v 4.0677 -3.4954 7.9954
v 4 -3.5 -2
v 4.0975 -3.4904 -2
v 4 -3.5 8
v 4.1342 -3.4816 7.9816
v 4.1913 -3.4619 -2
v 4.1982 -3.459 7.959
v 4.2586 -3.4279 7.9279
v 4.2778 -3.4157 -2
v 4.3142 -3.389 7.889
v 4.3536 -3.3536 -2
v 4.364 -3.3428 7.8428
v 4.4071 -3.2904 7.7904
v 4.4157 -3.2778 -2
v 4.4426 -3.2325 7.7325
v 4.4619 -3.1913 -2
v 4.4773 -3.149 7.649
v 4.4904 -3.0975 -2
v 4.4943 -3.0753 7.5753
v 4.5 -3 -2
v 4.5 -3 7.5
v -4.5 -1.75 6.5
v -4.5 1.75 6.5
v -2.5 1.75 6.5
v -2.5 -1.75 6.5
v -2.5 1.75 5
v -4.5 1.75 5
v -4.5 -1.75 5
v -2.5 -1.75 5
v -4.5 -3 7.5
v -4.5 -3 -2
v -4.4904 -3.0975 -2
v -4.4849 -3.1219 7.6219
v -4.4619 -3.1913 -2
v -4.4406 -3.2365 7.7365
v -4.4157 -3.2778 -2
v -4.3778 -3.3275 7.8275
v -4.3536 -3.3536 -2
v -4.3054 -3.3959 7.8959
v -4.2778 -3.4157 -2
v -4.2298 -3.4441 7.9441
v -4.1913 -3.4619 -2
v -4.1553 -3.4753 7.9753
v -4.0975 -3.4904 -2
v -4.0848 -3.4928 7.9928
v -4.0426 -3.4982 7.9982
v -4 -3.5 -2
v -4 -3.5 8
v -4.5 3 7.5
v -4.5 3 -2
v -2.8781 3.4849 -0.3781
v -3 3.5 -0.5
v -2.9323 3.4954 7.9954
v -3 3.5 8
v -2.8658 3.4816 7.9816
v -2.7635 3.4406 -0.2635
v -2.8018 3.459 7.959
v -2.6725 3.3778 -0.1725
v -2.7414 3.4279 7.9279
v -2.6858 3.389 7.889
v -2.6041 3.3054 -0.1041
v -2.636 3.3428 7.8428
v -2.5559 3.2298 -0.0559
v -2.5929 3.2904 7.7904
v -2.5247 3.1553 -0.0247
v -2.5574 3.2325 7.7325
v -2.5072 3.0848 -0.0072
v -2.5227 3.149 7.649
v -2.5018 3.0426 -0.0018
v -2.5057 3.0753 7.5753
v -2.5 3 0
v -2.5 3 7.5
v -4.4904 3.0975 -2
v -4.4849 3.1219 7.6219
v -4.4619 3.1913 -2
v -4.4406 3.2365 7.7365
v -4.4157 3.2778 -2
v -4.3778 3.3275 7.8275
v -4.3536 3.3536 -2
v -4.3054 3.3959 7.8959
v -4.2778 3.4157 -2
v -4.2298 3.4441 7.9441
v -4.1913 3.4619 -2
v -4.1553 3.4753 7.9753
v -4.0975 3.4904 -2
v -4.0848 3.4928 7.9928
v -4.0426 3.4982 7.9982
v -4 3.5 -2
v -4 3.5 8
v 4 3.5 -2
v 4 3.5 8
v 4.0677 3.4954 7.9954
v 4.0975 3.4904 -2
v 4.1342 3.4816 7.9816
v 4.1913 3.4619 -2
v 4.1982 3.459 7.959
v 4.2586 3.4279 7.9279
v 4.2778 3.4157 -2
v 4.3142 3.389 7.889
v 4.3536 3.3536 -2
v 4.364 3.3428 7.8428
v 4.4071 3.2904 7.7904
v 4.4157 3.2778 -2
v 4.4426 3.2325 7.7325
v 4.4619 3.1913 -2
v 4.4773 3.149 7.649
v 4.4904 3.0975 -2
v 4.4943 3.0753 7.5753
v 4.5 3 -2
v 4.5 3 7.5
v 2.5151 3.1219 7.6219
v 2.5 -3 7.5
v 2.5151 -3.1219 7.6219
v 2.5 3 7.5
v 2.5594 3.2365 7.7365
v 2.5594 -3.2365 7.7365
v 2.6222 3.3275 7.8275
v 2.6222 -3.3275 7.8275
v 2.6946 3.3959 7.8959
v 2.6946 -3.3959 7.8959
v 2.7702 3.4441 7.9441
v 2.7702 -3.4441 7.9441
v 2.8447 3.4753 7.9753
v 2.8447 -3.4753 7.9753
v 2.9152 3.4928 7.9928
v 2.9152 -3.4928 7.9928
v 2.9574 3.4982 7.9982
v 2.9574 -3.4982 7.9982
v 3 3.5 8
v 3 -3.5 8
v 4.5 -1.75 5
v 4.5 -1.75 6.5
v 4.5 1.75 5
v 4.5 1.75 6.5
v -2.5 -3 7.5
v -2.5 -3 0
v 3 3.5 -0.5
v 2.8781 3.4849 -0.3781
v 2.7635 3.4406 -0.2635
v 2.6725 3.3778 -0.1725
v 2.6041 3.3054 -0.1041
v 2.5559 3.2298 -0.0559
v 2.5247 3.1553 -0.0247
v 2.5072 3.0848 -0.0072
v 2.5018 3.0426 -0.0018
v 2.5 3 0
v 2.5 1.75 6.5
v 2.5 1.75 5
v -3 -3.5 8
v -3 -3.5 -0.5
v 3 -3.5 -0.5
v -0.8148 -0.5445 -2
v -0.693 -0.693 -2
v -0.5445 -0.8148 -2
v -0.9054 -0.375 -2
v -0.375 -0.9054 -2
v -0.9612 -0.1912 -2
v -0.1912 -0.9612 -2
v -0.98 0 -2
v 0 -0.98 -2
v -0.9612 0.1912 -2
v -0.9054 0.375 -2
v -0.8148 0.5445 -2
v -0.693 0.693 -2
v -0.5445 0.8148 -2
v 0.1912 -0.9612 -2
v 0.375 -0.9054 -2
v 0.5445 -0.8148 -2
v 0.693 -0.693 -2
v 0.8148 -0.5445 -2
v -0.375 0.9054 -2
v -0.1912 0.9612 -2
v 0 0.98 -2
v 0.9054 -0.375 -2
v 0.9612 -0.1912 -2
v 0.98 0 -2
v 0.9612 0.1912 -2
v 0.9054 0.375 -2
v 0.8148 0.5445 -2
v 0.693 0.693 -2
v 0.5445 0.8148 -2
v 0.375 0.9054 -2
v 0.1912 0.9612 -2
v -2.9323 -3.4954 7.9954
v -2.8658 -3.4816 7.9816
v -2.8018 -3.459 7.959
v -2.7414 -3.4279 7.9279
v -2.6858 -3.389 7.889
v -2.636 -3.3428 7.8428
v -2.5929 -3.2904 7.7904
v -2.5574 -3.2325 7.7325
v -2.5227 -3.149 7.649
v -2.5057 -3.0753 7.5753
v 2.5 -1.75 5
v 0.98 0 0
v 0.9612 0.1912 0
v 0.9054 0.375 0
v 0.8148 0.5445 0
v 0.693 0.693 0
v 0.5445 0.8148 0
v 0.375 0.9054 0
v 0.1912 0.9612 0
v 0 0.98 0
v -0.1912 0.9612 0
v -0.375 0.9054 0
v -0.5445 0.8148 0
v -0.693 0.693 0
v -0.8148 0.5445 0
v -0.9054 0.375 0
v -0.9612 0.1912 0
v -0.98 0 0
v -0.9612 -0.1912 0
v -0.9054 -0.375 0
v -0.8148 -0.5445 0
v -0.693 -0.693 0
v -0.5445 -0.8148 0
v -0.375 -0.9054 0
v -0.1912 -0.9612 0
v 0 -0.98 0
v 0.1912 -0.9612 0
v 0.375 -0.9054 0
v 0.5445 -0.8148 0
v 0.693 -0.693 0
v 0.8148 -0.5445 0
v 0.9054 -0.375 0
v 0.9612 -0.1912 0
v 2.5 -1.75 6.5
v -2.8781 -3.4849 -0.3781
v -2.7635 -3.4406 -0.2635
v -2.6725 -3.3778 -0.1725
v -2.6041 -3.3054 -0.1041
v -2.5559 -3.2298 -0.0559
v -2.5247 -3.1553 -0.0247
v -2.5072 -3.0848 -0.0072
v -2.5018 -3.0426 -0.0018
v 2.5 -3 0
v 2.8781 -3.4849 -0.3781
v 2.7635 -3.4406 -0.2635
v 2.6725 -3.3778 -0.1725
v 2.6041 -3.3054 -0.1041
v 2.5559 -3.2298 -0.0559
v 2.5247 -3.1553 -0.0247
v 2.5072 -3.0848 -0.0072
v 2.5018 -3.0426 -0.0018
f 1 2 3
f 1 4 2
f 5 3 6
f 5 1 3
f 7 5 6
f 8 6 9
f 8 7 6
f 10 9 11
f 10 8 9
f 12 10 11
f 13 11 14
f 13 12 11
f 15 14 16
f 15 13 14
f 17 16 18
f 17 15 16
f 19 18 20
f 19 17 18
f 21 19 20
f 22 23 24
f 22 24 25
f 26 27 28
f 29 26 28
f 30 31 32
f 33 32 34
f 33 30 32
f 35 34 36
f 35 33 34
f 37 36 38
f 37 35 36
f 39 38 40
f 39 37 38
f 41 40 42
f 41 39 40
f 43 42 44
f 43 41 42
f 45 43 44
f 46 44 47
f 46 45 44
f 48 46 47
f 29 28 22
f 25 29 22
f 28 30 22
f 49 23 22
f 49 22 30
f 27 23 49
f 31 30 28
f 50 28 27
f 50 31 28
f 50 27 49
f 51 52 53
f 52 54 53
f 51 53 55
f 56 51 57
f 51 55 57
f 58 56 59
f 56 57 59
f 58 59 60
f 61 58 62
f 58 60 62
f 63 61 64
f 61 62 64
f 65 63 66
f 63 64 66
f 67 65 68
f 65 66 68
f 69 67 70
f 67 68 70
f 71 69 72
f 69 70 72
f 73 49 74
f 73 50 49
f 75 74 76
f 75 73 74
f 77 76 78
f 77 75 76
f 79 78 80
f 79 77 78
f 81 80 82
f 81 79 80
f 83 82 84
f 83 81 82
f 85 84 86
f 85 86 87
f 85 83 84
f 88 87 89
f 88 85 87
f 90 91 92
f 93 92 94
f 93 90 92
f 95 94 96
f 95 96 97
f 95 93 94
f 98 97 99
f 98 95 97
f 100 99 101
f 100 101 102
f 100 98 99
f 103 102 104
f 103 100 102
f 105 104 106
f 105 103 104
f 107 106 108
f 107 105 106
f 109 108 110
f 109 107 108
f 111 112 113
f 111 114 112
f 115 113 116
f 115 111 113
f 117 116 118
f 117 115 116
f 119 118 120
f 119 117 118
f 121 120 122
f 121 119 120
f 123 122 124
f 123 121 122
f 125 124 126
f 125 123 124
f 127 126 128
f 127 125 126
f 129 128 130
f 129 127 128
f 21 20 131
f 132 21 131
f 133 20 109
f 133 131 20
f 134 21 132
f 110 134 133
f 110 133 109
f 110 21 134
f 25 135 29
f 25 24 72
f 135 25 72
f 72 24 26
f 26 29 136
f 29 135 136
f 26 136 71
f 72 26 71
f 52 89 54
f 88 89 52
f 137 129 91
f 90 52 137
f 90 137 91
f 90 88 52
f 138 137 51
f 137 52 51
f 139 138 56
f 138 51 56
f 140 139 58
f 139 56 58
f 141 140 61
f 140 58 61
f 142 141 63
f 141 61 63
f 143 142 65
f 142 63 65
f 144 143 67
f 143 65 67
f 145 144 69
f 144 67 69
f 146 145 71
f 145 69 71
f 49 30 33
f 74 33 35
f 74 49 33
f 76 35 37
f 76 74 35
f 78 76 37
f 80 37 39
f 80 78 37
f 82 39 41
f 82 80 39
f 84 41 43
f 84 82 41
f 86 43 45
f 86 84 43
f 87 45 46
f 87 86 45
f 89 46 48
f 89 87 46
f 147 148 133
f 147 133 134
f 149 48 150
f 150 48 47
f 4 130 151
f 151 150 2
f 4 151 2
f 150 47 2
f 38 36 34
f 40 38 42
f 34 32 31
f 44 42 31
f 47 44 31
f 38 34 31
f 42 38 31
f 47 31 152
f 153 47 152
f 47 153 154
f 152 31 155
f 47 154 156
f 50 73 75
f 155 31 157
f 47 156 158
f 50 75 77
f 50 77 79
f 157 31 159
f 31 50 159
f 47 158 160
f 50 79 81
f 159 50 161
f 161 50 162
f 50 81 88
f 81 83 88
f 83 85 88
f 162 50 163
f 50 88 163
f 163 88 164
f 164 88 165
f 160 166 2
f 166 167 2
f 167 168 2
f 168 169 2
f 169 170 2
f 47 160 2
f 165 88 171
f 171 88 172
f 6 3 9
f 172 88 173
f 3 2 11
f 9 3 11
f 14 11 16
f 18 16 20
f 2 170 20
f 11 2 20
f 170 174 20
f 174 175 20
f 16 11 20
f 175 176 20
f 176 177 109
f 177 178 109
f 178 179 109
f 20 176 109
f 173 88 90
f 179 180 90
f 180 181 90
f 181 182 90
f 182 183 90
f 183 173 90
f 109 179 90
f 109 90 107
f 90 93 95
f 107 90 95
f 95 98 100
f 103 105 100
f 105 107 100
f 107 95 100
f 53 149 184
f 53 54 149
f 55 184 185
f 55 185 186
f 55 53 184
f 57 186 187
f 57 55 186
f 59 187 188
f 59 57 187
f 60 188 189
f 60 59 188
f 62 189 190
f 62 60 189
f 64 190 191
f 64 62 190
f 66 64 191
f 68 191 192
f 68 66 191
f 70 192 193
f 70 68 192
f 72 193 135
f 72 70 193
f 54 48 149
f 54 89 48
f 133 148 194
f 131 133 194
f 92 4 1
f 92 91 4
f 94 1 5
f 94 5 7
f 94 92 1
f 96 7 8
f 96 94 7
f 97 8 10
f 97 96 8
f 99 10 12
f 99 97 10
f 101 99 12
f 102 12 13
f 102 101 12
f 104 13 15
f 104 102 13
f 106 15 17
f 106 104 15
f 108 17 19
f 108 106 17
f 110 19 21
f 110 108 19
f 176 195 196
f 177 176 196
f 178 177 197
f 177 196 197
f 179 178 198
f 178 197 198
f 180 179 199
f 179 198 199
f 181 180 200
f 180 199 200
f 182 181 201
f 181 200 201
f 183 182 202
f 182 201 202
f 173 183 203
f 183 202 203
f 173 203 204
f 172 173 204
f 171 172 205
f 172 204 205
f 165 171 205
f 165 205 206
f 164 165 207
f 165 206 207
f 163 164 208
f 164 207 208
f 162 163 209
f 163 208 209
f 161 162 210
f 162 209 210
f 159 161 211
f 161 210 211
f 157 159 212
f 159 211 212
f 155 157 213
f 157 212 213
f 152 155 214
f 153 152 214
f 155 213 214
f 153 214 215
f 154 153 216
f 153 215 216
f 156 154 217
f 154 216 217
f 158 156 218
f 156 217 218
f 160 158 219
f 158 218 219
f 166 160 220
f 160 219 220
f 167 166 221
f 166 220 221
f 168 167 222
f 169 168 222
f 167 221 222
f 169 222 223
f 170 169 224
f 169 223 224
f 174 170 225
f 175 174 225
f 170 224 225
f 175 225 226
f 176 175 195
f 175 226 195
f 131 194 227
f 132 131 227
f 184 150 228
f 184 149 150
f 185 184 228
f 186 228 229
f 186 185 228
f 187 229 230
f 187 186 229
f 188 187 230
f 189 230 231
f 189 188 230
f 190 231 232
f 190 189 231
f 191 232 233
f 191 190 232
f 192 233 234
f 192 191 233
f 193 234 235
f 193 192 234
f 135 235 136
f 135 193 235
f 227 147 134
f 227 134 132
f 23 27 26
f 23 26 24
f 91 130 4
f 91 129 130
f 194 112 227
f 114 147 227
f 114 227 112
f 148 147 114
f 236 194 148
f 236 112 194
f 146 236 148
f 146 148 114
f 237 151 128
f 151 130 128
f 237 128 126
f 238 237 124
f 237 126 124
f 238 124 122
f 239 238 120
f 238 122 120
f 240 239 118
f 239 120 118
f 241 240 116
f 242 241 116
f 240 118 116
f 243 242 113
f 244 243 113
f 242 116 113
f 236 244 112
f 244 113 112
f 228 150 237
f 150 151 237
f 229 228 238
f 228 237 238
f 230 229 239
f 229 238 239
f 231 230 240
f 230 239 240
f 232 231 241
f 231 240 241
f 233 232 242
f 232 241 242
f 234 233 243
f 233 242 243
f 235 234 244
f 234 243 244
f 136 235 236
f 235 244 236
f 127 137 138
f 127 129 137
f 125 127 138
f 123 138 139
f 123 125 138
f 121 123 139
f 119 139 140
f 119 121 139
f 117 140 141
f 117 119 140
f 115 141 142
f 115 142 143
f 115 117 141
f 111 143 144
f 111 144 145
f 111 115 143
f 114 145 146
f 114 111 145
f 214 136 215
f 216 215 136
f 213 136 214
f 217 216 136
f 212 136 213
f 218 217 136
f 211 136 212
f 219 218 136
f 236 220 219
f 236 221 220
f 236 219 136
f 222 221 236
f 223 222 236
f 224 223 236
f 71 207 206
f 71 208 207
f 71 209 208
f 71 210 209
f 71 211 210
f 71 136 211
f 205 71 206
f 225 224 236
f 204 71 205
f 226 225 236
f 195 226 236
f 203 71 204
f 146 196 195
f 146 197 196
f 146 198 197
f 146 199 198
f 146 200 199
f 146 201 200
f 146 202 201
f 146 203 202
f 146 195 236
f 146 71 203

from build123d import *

# Parameters (mm, degrees)
F0_W     = 2
F0_H     = 7
F0_W_2   = 5
F0_R     = 0.98
F1_DEPTH = 2
F2_DEPTH = 8
F3_W     = 3.5
F3_H     = 1.5
F4_DEPTH = 25
F5_R     = 0.5


with BuildPart() as f1:
    # F0 (on Top) → F1 (new body)
    with BuildSketch(Plane.XY):
        with Locations((-3.5, 0)):
            Rectangle(F0_W, F0_H)
        Rectangle(F0_W_2, F0_H)
        Circle(F0_R, mode=Mode.SUBTRACT)
        with Locations((3.5, 0)):
            Rectangle(F0_W, F0_H)
    extrude(amount=-F1_DEPTH)

    # F0 (on Top) → F2 (join)
    with BuildSketch(Plane.XY):
        with Locations((-3.5, 0)):
            Rectangle(F0_W, F0_H)
        with Locations((3.5, 0)):
            Rectangle(F0_W, F0_H)
    extrude(amount=F2_DEPTH)

    # F3 (on face) → F4 (cut)
    with BuildSketch(Plane(origin=(-4.5, 0, 0), x_dir=(0, -1, 0), z_dir=(-1, 0, 0))):
        with Locations((0, 5.75)):
            Rectangle(F3_W, F3_H)
    extrude(amount=-F4_DEPTH, mode=Mode.SUBTRACT)

    # F5
    f5_edges = [f1.edges().sort_by_distance(p)[0] for p in [
        (-2.5, -3.5, 4),
        (-4.5, 0, 8),
        (-2.5, 0, 8),
        (2.5, 0, 8),
        (4.5, 0, 8),
        (2.5, -3.5, 4),
        (4.5, -3.5, 3),
        (-4.5, -3.5, 3),
        (-4.5, 3.5, 3),
        (2.5, 3.5, 4),
        (4.5, 3.5, 3),
        (-2.5, 3.5, 4),
        (0, -3.5, 0),
        (0, 3.5, 0),
    ]]
    fillet(f5_edges, radius=F5_R)


solid = f1.part
